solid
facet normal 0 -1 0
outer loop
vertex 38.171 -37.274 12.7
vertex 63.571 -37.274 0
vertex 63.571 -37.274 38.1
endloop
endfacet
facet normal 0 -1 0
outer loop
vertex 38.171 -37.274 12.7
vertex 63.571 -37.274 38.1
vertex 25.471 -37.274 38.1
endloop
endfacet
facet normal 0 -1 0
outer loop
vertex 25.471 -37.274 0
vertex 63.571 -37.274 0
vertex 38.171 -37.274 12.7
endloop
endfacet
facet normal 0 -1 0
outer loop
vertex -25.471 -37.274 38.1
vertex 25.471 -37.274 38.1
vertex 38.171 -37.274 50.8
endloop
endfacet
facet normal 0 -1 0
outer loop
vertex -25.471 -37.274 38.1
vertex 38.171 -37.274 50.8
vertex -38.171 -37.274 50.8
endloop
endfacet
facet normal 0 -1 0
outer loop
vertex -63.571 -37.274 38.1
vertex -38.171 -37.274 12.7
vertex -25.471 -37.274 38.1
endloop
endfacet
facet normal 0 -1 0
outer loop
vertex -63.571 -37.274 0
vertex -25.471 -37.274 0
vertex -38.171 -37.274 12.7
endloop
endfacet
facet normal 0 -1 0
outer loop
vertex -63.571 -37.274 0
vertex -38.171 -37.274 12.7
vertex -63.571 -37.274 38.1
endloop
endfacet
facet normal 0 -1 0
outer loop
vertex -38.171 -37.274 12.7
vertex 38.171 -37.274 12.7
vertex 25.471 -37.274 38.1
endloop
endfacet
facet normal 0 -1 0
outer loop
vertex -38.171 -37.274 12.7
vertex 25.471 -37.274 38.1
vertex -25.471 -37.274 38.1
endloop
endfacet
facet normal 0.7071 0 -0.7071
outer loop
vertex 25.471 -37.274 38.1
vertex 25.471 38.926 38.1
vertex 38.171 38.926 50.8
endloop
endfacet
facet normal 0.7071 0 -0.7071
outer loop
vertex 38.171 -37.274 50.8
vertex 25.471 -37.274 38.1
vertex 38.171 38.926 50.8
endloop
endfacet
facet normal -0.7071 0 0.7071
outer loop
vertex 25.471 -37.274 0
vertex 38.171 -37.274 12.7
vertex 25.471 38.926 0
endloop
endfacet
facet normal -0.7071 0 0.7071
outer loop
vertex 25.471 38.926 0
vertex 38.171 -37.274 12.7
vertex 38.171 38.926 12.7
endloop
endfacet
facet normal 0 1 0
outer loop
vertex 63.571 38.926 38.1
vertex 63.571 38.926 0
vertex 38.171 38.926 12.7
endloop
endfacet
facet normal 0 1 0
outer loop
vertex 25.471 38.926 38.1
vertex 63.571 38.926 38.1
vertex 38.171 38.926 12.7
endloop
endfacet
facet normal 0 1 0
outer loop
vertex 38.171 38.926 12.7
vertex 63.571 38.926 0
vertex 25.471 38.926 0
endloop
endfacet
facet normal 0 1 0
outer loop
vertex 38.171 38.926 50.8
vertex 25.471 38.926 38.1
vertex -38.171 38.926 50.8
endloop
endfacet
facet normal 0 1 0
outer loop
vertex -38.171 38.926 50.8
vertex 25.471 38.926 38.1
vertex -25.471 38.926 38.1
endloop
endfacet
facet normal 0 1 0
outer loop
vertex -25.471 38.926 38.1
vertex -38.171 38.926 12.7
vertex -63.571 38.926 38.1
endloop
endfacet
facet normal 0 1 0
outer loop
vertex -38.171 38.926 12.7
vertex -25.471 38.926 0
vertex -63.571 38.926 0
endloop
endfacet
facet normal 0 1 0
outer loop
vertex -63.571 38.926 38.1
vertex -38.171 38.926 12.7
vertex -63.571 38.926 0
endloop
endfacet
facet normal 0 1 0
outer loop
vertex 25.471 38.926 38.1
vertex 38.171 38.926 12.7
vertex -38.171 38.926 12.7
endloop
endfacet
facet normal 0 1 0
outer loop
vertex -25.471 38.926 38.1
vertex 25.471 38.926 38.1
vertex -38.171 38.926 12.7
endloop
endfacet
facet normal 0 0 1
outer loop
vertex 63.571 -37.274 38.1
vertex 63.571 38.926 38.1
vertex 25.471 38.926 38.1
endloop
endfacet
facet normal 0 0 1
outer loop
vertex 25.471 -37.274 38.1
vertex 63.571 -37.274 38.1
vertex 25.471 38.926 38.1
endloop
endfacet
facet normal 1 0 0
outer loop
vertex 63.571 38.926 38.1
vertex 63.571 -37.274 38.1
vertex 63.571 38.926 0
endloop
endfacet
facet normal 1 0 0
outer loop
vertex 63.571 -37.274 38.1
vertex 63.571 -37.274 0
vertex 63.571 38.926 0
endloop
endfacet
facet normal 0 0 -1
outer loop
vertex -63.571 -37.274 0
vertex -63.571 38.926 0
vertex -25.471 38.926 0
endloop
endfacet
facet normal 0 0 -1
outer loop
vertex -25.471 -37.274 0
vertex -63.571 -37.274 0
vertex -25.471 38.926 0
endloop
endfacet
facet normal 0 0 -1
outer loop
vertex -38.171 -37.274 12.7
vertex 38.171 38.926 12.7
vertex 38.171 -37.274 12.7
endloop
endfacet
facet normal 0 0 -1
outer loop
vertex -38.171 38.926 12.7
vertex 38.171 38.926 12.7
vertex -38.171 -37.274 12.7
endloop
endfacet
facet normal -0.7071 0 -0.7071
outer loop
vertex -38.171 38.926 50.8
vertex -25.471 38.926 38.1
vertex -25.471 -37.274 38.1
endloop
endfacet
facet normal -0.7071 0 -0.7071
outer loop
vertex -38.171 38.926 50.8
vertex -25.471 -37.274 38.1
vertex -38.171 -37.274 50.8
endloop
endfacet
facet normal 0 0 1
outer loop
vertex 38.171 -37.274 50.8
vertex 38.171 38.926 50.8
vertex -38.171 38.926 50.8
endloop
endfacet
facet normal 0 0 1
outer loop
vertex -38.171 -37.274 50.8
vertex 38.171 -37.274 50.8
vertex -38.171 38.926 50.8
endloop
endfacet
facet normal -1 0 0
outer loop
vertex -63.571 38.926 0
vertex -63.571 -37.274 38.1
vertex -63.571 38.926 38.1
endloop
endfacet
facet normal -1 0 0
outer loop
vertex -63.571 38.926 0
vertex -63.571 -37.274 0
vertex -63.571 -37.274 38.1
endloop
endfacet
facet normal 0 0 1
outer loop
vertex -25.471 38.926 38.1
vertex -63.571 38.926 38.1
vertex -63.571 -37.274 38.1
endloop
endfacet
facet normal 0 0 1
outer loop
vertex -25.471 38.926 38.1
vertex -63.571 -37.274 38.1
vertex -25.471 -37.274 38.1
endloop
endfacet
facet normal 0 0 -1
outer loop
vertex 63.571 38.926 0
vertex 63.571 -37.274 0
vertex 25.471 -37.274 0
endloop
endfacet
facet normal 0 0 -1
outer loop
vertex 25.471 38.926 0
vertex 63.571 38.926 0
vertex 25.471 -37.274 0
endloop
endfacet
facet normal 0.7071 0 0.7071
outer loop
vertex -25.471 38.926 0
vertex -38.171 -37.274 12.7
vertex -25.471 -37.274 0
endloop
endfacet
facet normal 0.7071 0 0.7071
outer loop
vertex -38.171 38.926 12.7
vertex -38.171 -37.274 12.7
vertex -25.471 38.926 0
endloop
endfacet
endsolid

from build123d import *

# Parameters (mm, degrees)
F0_W     = 38.1
F0_H     = 76.2
F1_DEPTH = 12.7
F2_SIZE  = 12.69999
F3_W     = 76.2
F3_H     = 76.2
F4_DEPTH = 25.4
F5_W     = 50.8
F5_H     = 76.2
F6_DEPTH = 12.7
F8_DEPTH = 76.201


# Not quite as in the source:
# - a fillet or chamfer is up to 0.001 mm smaller than in the source, because OpenCascade refuses the exact size


with BuildPart() as f1:
    # F0 (on Top) → F1 (new body)
    with BuildSketch(Plane.XY):
        with Locations((-44.5209794172, 0.8258419111)):
            Rectangle(F0_W, F0_H)
    extrude(amount=F1_DEPTH)

    # F2 (size 12.7 in the source; OpenCascade refuses exactly that, so slightly less here)
    f2_edges = [f1.edges().sort_by_distance(p)[0] for p in [
        (-25.470979, 0.825842, 12.7),
    ]]
    chamfer(f2_edges, length=F2_SIZE)

    # F3 (on face) → F4 (join)
    with BuildSketch(Plane.XY.offset(12.7)):
        with Locations((-25.4709794172, 0.8258419111)):
            Rectangle(F3_W, F3_H)
    extrude(amount=F4_DEPTH)

    # F5 (on face) → F6 (join)
    with BuildSketch(Plane.XY.offset(38.1)):
        with Locations((-12.7709794172, 0.8258419111)):
            Rectangle(F5_W, F5_H)
    extrude(amount=F6_DEPTH)

    # F7 (on face) → F8 (cut, through all)
    with BuildSketch(Plane.XZ.offset(37.2741580889)):
        Polygon((-38.1709794172, 50.8), (-38.1709794172, 38.1), (-25.4709794172, 38.1), align=None)
    extrude(amount=-F8_DEPTH, mode=Mode.SUBTRACT)

    # F9: F1 across plane


with BuildPart() as f1_1:
    add(f1.part)
    add(f1.part.mirror(Plane.YZ))


solid = f1_1.part
